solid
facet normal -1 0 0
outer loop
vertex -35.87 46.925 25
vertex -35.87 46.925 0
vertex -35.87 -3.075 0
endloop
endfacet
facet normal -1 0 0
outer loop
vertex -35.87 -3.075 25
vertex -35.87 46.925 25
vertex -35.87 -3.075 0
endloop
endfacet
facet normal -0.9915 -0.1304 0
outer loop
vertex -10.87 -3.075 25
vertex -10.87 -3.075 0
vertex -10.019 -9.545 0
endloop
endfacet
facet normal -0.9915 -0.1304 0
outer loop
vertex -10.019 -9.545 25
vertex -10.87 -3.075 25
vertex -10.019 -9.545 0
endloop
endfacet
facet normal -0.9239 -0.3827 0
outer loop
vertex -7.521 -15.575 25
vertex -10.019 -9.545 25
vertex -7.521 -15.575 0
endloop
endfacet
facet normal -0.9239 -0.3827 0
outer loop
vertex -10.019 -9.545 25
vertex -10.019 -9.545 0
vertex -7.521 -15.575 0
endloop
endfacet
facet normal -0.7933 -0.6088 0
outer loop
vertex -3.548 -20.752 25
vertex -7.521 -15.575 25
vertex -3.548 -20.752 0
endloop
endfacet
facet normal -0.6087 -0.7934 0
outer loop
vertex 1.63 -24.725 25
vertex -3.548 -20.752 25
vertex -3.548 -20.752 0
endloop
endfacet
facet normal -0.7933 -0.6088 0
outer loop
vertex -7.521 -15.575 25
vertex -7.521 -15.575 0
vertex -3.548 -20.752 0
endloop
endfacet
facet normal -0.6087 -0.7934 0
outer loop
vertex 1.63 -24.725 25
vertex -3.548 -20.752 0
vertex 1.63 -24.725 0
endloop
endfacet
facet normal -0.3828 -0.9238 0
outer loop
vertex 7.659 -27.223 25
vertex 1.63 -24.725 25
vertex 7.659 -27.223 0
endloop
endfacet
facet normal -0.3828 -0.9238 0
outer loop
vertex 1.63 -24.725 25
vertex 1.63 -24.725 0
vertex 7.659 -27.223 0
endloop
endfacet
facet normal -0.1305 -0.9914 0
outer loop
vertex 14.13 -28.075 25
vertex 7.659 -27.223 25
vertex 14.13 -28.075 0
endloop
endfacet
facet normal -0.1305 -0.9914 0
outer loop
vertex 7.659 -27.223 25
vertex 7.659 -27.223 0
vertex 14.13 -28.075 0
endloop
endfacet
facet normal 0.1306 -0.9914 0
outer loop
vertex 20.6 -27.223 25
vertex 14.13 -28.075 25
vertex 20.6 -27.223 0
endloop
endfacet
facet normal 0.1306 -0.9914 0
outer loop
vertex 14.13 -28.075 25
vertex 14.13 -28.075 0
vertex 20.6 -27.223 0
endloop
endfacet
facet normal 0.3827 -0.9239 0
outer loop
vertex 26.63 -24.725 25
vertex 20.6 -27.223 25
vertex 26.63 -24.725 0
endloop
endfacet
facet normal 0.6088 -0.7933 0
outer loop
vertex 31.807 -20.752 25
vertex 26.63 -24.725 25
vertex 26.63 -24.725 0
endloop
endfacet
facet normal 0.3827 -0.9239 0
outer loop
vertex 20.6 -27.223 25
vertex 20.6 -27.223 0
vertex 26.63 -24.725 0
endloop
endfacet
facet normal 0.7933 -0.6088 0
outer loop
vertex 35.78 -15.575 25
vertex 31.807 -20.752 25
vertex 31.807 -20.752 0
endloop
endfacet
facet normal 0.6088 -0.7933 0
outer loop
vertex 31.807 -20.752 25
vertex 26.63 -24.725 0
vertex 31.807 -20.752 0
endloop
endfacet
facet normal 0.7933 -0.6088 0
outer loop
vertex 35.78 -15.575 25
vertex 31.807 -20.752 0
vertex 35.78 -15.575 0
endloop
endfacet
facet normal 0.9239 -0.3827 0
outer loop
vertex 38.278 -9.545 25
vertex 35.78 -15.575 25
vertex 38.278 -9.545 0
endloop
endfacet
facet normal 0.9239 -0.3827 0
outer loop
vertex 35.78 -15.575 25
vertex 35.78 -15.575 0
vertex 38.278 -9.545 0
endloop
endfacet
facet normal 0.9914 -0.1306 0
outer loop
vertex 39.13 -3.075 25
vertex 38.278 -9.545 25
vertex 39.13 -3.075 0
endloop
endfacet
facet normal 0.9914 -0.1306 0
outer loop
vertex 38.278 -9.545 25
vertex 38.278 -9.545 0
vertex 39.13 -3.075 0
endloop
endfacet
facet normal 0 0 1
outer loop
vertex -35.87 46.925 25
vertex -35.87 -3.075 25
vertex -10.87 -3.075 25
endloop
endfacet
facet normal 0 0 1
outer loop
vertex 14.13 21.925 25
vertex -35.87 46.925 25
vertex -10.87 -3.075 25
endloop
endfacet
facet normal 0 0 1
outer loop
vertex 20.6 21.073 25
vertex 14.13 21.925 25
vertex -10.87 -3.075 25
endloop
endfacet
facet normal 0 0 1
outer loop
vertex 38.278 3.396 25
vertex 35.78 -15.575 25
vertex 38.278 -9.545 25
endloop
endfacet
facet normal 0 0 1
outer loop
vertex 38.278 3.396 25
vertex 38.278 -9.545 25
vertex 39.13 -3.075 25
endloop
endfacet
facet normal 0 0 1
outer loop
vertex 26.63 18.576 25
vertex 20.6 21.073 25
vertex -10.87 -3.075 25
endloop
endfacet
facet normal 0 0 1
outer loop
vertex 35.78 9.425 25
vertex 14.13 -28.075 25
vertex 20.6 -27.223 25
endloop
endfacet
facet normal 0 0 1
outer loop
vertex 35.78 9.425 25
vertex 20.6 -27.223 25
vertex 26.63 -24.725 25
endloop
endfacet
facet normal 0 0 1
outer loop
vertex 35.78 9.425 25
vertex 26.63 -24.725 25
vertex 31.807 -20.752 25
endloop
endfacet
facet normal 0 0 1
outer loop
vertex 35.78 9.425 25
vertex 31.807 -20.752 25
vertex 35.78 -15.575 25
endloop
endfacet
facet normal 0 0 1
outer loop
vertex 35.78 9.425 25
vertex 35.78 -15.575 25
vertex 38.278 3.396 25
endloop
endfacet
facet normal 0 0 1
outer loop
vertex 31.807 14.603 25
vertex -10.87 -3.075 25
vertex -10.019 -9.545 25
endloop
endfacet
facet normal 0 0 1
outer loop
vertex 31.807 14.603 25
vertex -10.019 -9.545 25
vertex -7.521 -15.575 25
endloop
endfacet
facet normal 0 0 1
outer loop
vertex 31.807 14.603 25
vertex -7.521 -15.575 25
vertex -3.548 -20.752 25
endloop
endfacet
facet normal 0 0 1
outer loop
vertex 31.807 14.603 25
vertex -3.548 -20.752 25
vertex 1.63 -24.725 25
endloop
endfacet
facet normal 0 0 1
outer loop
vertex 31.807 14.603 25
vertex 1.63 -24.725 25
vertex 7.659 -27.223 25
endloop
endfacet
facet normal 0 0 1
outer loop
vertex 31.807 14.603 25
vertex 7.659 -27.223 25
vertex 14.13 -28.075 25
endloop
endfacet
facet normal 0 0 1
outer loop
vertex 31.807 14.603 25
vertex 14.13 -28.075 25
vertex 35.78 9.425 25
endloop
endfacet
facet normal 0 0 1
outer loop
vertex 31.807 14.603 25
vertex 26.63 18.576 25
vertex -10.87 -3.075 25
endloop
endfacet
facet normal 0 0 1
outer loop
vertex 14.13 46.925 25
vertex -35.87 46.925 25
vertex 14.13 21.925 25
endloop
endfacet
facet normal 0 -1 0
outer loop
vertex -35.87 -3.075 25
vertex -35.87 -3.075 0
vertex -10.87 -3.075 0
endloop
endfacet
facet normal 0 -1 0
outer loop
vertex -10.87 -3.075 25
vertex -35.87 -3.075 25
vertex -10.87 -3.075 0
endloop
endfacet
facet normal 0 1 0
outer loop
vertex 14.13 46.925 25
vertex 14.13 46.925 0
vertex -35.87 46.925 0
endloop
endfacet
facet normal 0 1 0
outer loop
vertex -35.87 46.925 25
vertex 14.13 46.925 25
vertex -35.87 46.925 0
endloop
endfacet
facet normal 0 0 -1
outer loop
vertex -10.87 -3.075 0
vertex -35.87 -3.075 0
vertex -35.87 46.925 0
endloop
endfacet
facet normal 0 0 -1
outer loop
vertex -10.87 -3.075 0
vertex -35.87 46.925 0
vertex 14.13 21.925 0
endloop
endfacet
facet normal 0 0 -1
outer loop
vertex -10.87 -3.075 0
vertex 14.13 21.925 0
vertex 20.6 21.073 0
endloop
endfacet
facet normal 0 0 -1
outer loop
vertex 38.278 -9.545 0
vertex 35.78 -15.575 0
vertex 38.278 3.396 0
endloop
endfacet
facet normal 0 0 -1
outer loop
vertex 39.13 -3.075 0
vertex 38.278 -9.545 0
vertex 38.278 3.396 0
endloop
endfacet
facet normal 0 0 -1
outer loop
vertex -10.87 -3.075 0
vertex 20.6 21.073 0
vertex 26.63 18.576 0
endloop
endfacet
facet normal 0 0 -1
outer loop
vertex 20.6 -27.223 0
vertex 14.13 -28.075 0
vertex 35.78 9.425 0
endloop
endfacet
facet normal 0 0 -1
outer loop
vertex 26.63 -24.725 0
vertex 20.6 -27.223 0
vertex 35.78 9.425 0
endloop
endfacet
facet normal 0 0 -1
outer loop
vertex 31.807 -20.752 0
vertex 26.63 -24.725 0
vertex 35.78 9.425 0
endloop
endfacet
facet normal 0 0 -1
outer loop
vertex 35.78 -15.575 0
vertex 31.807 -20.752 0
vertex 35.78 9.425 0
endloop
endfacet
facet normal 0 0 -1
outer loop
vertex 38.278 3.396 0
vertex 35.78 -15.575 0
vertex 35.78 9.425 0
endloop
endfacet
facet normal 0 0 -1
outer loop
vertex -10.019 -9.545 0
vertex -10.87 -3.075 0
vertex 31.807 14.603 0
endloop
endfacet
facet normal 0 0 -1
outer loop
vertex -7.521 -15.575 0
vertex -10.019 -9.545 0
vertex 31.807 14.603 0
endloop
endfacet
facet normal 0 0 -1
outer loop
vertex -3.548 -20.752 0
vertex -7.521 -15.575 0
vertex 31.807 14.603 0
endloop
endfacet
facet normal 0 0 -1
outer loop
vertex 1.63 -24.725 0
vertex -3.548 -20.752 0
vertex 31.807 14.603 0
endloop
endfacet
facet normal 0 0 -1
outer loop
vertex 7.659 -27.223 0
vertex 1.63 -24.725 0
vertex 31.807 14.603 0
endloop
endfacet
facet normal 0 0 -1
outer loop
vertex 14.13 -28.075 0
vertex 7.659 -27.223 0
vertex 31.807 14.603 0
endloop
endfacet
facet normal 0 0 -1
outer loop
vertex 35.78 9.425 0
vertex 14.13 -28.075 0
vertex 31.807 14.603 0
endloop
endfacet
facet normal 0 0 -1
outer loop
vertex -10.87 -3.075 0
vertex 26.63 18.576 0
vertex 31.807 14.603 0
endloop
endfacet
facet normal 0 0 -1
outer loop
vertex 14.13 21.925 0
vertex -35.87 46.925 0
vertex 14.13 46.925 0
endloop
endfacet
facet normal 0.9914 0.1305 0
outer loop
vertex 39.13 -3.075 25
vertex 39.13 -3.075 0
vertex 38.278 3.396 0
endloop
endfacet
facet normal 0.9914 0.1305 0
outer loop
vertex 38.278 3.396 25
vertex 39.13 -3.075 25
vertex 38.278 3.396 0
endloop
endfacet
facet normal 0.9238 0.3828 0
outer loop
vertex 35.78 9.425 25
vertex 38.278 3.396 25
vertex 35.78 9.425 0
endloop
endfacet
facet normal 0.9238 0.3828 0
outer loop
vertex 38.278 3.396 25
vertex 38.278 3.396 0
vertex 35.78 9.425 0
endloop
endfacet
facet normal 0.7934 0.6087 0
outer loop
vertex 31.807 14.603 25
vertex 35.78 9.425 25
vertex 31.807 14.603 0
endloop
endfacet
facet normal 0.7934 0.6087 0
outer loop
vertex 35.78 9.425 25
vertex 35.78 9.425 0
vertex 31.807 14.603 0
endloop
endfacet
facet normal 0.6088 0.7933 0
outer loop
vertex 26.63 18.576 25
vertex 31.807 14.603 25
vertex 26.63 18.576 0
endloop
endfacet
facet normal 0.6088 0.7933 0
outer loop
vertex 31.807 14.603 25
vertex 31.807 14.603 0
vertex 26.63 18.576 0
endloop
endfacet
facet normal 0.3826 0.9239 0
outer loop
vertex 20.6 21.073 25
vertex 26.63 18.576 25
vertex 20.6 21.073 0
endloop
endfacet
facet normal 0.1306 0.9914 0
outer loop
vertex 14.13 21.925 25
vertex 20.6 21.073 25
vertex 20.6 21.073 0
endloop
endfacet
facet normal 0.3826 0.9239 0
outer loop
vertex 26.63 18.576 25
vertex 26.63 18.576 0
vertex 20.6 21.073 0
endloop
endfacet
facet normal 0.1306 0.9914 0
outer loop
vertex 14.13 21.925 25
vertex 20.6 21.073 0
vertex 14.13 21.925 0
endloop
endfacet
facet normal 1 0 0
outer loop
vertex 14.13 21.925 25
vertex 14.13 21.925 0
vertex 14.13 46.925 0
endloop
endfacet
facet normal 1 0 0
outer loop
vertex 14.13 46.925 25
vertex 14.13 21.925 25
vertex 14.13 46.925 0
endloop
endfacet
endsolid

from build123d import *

# Parameters (mm, degrees)
F1_DEPTH = 25


with BuildPart() as f1:
    # F0 (on Top) → F1 (new body)
    with BuildSketch(Plane.XY):
        with BuildLine():
            ThreePointArc((39.129609, -3.07483), (31.807278, 14.60284), (14.129609, 21.92517))
            Line((14.129609, 21.92517), (14.129609, -3.07483))
            Line((14.129609, -3.07483), (-10.870391, -3.07483))
            ThreePointArc((-10.870391, -3.07483), (14.129609, -28.07483), (39.129609, -3.07483))
        make_face()
        with BuildLine():
            Line((14.129609, -3.07483), (14.129609, 21.92517))
            ThreePointArc((14.129609, 21.92517), (-3.548061, 14.60284), (-10.870391, -3.07483))
            Line((-10.870391, -3.07483), (14.129609, -3.07483))
        make_face()
        with BuildLine():
            Line((14.129609, 46.92517), (-35.870391, 46.92517))
            Line((-35.870391, 46.92517), (-35.870391, -3.07483))
            Line((-35.870391, -3.07483), (-10.870391, -3.07483))
            ThreePointArc((-10.870391, -3.07483), (-3.548061, 14.60284), (14.129609, 21.92517))
            Line((14.129609, 21.92517), (14.129609, 46.92517))
        make_face()
    extrude(amount=F1_DEPTH)


solid = f1.part
